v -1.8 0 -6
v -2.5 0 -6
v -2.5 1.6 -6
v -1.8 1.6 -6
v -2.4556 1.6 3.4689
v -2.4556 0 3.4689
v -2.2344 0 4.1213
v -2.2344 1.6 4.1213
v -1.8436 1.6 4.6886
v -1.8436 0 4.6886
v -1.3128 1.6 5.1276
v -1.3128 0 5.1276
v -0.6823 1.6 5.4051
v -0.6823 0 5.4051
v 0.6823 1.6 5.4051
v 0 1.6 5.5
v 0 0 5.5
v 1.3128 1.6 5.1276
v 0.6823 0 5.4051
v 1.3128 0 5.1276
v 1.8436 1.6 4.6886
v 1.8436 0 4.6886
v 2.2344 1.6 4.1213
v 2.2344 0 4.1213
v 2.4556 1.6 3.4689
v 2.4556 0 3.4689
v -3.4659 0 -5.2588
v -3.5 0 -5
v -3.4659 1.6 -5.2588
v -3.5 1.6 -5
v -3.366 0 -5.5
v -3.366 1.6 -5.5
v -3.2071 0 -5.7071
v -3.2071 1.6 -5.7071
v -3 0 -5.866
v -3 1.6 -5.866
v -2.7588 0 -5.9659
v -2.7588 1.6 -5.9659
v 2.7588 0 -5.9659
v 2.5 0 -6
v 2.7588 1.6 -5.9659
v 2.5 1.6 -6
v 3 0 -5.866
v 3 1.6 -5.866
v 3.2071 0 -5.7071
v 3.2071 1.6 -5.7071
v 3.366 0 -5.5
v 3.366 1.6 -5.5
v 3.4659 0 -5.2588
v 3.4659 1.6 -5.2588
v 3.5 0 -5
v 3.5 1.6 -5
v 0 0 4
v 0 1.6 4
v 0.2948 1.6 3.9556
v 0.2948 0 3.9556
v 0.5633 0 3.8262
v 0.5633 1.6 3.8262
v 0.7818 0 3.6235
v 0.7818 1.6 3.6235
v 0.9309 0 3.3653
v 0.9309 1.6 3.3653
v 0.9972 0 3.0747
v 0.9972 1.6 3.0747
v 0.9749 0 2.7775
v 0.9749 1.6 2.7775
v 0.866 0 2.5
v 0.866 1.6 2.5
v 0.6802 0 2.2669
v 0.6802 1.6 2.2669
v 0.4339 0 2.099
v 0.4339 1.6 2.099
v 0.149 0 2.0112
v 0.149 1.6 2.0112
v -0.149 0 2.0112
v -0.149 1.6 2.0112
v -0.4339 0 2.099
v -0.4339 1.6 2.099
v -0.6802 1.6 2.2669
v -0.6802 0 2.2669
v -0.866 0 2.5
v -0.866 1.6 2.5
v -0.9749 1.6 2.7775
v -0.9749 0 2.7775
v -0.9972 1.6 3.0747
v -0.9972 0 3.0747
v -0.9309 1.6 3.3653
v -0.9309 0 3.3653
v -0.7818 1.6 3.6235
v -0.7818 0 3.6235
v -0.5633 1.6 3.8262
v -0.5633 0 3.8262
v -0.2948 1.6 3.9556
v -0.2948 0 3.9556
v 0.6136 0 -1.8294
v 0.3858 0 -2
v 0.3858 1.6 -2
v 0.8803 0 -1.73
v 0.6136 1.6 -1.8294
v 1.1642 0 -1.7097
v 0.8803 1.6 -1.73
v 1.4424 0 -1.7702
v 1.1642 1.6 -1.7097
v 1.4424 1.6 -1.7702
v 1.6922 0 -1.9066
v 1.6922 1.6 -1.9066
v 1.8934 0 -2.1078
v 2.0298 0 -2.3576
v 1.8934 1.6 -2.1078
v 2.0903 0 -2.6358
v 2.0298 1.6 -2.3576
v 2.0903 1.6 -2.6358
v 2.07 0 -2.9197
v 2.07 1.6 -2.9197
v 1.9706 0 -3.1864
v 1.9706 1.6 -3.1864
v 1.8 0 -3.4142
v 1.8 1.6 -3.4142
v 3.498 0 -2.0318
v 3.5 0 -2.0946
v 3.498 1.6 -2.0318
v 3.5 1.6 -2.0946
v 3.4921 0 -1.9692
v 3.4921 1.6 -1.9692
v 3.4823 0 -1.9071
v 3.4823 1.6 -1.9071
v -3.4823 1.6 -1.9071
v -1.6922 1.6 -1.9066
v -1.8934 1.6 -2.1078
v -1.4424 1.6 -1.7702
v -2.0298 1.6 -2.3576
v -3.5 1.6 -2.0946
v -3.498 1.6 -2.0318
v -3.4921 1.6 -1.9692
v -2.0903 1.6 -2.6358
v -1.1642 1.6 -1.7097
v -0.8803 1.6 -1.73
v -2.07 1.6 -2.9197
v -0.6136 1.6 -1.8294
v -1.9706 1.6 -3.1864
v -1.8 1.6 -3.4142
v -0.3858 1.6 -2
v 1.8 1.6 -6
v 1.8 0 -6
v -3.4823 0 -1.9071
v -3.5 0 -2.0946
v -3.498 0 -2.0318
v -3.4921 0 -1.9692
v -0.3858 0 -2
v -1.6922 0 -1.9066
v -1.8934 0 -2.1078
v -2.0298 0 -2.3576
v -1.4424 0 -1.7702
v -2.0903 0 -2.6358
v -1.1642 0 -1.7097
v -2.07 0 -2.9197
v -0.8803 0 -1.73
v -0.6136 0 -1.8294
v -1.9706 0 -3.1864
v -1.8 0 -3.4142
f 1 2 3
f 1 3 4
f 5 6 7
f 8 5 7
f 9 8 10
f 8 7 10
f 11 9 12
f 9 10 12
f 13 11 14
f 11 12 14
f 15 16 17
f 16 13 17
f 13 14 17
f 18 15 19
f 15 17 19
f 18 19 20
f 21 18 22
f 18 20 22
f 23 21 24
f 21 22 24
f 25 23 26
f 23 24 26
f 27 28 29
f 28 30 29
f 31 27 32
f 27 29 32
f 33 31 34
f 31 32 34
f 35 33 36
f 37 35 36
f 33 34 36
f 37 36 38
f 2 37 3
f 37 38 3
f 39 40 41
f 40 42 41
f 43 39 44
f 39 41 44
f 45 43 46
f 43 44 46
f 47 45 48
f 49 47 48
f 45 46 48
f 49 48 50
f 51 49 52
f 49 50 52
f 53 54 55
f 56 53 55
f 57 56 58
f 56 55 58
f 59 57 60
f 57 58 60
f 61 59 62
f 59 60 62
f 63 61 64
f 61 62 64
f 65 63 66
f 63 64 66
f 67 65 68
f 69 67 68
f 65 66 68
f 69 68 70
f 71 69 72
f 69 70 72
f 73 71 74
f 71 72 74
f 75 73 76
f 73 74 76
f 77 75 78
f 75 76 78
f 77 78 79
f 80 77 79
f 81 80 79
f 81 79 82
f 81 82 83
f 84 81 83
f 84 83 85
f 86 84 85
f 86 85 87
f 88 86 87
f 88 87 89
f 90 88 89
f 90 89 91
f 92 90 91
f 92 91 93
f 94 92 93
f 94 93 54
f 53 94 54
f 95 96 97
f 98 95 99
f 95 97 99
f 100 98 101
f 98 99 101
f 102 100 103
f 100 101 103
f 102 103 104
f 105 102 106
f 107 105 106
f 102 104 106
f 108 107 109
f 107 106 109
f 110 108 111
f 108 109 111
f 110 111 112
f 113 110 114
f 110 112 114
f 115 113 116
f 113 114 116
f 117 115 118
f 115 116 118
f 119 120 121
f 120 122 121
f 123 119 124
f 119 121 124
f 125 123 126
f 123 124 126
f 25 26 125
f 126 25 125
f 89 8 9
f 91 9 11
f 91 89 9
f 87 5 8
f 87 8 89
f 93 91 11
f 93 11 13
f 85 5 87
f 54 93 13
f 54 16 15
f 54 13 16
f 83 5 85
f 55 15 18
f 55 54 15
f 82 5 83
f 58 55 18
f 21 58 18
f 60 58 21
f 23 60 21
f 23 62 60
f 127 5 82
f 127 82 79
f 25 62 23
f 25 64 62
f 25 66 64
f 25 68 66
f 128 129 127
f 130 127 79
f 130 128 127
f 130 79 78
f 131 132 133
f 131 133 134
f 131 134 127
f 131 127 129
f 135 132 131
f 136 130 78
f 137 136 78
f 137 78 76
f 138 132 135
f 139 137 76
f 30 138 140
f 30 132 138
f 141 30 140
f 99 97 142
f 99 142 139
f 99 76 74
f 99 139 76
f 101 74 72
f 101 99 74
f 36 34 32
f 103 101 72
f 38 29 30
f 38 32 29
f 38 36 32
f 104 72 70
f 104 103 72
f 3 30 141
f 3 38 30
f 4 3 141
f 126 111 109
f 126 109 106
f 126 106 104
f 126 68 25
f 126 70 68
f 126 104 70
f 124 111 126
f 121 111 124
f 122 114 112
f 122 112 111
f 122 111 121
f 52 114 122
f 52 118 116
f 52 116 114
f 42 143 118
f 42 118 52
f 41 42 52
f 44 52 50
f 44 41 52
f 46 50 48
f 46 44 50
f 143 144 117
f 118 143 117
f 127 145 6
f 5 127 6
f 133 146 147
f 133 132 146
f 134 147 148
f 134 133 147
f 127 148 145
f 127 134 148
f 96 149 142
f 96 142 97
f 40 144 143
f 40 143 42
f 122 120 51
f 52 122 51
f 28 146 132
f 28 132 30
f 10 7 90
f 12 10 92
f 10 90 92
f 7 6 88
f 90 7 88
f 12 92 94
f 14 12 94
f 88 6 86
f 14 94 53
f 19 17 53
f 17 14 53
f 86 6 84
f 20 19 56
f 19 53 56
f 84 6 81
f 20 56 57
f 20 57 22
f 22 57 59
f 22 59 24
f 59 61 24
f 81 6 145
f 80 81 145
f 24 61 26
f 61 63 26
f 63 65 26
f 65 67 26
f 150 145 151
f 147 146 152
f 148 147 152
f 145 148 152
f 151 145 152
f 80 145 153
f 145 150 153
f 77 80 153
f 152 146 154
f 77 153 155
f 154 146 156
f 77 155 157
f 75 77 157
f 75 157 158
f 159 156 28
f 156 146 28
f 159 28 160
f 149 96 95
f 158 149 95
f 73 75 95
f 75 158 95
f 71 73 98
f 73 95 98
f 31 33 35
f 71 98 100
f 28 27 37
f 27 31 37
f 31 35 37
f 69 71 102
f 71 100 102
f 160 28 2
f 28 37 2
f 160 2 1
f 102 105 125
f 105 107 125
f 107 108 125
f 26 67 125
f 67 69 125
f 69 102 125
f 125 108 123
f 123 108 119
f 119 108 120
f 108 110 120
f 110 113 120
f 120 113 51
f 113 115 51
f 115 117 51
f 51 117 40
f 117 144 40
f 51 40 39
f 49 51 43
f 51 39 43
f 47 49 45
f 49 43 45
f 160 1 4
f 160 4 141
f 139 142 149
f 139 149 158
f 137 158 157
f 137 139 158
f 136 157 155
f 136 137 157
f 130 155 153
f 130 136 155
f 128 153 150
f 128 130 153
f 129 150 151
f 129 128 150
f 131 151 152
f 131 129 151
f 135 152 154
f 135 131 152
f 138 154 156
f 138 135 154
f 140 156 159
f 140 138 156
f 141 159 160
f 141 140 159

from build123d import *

# Parameters (mm, degrees)
SKETCH1_W               = 7
SKETCH1_H               = 12
BOSS_EXTRUDE1_DEPTH     = 1.6
SKETCH3_W               = 3.6
SKETCH3_H               = 4
CUT_EXTRUDE2_DEPTH      = 8.128113355
SKETCH4_R               = 1
CUT_EXTRUDE3_DEPTH      = 10
CUT_EXTRUDE4_DEPTH      = 8.128113355
CUT_EXTRUDE4_DEPTH_BACK = 8.128113355
FILLET1_R               = 1
CUT_EXTRUDE5_DEPTH      = 8.128113355


with BuildPart() as part:
    # Sketch1 → Boss-Extrude1 (new body)
    with BuildSketch(Plane(origin=(0, 0, 0), x_dir=(1, 0, 0), z_dir=(0, 1, 0))):
        Rectangle(SKETCH1_W, SKETCH1_H)
    extrude(amount=BOSS_EXTRUDE1_DEPTH)

    # Sketch3 → Cut-Extrude2 (cut, through all)
    with BuildSketch(Plane.XZ):
        with Locations((0, -4)):
            Rectangle(SKETCH3_W, SKETCH3_H)
    extrude(amount=-CUT_EXTRUDE2_DEPTH, mode=Mode.SUBTRACT)

    # Sketch4 → Cut-Extrude3 (cut)
    with BuildSketch(Plane(origin=(0, 1.6, 0), x_dir=(1, 0, 0), z_dir=(0, 1, 0))):
        with Locations(Location((0, -3, 0), (0, 0, 270))):
            Circle(SKETCH4_R)
    extrude(amount=-CUT_EXTRUDE3_DEPTH, mode=Mode.SUBTRACT)

    # Sketch5 → Cut-Extrude4 (cut, two sides: drawn at the far end of the back side and taken through both)
    with BuildSketch(Plane(origin=(0, 1.6, 0), x_dir=(1, 0, 0), z_dir=(0, 1, 0)).offset(-CUT_EXTRUDE4_DEPTH_BACK)):
        with BuildLine():
            Line((2.455625625, -3.468937938), (3.5, 2))
            Line((3.5, 2), (6.178310216, -2.368643633))
            Line((6.178310216, -2.368643633), (0.801322839, -12.436782797))
            Line((0.801322839, -12.436782797), (-8.05270341, -5.5))
            Line((-8.05270341, -5.5), (-3.5, 2))
            Line((-3.5, 2), (-2.455625625, -3.468937938))
            ThreePointArc((-2.455625625, -3.468937938), (0, -5.5), (2.455625625, -3.468937938))
        make_face()
    extrude(amount=CUT_EXTRUDE4_DEPTH + CUT_EXTRUDE4_DEPTH_BACK, mode=Mode.SUBTRACT)

    # Fillet1
    fillet1_edges = [part.edges().sort_by_distance(p)[0] for p in [
        (3.5, 0.8, -2),
        (-3.5, 0.8, -2),
        (-3.5, 0.8, -6),
        (3.5, 0.8, -6),
    ]]
    fillet(fillet1_edges, radius=FILLET1_R)

    # Sketch8 → Cut-Extrude5 (cut, through all)
    with BuildSketch(Plane(origin=(0, 1.6, 0), x_dir=(1, 0, 0), z_dir=(0, 1, 0))):
        with BuildLine():
            Line((1.8, 3.414213562), (0.385786438, 2))
            ThreePointArc((0.385786438, 2), (1.8, 2), (1.8, 3.414213562))
        make_face()
        with BuildLine():
            Line((-1.8, 3.414213562), (-0.385786438, 2))
            ThreePointArc((-0.385786438, 2), (-1.8, 2), (-1.8, 3.414213562))
        make_face()
    extrude(amount=-CUT_EXTRUDE5_DEPTH, mode=Mode.SUBTRACT)


solid = part.part
